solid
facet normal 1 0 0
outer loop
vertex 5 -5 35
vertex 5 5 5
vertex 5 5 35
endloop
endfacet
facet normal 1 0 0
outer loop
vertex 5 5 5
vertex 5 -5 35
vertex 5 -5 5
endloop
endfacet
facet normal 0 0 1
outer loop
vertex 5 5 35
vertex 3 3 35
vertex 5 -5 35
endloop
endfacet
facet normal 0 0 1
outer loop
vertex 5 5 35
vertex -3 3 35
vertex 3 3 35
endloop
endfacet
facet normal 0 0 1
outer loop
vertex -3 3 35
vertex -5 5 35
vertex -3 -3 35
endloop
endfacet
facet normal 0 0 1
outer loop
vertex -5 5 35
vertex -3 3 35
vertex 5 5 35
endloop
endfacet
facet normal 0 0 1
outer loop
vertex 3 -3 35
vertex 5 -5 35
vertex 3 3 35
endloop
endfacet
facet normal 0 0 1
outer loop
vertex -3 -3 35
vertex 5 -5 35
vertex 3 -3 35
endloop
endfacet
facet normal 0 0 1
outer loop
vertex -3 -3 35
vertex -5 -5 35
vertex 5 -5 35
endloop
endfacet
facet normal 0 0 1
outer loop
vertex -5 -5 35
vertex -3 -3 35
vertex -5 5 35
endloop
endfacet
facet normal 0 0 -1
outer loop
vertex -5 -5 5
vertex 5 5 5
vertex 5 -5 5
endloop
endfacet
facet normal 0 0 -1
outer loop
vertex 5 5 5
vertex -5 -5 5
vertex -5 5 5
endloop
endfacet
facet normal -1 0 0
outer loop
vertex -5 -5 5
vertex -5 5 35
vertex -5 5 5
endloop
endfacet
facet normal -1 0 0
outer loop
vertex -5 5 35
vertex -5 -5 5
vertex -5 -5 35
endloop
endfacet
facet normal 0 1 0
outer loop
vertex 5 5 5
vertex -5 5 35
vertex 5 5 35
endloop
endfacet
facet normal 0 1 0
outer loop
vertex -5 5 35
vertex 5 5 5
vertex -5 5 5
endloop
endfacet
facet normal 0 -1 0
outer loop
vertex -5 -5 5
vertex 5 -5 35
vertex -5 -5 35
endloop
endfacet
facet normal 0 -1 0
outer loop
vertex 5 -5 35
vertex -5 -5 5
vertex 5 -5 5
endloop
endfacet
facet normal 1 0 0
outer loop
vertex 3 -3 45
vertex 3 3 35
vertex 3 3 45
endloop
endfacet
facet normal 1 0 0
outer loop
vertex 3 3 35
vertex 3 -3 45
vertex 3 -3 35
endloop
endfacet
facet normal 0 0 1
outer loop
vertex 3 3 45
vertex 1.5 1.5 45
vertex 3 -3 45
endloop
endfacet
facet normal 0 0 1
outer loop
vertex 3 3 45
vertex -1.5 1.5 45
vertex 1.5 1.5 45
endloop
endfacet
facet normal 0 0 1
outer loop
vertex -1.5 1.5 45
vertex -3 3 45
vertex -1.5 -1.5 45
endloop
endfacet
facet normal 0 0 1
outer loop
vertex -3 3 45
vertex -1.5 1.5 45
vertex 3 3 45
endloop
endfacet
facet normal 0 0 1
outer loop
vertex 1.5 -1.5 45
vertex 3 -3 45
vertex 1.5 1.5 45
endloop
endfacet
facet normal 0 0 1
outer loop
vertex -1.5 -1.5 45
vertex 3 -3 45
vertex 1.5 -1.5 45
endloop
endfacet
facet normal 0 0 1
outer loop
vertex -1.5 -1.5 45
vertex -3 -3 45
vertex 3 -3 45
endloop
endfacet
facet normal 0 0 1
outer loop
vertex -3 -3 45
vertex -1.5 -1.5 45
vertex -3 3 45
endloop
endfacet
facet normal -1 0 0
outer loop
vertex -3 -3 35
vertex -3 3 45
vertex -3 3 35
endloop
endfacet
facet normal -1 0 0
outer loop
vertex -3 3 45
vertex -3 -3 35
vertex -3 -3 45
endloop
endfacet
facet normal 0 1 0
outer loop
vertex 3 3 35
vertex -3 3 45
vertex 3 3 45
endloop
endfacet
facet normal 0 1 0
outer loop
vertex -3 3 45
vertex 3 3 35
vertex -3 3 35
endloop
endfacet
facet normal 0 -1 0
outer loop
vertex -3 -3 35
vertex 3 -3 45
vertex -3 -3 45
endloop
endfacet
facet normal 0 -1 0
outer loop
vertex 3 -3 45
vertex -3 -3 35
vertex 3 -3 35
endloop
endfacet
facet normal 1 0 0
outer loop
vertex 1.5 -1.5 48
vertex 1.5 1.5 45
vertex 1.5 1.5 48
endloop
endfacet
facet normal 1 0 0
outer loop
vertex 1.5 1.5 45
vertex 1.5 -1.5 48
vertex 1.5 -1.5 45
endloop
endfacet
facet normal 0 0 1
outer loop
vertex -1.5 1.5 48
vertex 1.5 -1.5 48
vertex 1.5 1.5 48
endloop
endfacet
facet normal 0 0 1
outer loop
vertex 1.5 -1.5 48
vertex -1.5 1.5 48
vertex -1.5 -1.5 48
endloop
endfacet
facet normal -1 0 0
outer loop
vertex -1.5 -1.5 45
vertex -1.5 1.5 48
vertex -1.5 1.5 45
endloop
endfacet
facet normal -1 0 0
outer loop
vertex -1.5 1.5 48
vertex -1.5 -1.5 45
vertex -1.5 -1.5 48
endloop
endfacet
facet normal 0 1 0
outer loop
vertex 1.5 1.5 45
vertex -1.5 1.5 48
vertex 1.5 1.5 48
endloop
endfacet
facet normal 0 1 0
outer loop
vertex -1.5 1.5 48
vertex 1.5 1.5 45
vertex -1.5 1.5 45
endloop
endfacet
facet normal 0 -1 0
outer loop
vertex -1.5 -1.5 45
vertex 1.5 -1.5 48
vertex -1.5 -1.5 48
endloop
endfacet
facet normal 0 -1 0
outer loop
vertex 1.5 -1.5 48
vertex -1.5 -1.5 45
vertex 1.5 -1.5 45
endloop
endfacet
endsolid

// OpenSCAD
X=0;
Y=1;
Z=2;

A = [30,30,10];
B = [10,10,30];
C = [6,6,10];
D = [3,3,3];

posB=[0,0,B[Z]/2 +A[Z]/2];
posC=posB+[0,0,B[Z]/2+C[Z]/2];
posD=posC+[0,0,C[Z]/2+D[Z]/2];

%cube(A,center=true);

translate(posB)
    cube(B, center=true);
    
translate(posC)
    cube(C, center=true);
    
translate(posD)
    cube(D, center=true);
